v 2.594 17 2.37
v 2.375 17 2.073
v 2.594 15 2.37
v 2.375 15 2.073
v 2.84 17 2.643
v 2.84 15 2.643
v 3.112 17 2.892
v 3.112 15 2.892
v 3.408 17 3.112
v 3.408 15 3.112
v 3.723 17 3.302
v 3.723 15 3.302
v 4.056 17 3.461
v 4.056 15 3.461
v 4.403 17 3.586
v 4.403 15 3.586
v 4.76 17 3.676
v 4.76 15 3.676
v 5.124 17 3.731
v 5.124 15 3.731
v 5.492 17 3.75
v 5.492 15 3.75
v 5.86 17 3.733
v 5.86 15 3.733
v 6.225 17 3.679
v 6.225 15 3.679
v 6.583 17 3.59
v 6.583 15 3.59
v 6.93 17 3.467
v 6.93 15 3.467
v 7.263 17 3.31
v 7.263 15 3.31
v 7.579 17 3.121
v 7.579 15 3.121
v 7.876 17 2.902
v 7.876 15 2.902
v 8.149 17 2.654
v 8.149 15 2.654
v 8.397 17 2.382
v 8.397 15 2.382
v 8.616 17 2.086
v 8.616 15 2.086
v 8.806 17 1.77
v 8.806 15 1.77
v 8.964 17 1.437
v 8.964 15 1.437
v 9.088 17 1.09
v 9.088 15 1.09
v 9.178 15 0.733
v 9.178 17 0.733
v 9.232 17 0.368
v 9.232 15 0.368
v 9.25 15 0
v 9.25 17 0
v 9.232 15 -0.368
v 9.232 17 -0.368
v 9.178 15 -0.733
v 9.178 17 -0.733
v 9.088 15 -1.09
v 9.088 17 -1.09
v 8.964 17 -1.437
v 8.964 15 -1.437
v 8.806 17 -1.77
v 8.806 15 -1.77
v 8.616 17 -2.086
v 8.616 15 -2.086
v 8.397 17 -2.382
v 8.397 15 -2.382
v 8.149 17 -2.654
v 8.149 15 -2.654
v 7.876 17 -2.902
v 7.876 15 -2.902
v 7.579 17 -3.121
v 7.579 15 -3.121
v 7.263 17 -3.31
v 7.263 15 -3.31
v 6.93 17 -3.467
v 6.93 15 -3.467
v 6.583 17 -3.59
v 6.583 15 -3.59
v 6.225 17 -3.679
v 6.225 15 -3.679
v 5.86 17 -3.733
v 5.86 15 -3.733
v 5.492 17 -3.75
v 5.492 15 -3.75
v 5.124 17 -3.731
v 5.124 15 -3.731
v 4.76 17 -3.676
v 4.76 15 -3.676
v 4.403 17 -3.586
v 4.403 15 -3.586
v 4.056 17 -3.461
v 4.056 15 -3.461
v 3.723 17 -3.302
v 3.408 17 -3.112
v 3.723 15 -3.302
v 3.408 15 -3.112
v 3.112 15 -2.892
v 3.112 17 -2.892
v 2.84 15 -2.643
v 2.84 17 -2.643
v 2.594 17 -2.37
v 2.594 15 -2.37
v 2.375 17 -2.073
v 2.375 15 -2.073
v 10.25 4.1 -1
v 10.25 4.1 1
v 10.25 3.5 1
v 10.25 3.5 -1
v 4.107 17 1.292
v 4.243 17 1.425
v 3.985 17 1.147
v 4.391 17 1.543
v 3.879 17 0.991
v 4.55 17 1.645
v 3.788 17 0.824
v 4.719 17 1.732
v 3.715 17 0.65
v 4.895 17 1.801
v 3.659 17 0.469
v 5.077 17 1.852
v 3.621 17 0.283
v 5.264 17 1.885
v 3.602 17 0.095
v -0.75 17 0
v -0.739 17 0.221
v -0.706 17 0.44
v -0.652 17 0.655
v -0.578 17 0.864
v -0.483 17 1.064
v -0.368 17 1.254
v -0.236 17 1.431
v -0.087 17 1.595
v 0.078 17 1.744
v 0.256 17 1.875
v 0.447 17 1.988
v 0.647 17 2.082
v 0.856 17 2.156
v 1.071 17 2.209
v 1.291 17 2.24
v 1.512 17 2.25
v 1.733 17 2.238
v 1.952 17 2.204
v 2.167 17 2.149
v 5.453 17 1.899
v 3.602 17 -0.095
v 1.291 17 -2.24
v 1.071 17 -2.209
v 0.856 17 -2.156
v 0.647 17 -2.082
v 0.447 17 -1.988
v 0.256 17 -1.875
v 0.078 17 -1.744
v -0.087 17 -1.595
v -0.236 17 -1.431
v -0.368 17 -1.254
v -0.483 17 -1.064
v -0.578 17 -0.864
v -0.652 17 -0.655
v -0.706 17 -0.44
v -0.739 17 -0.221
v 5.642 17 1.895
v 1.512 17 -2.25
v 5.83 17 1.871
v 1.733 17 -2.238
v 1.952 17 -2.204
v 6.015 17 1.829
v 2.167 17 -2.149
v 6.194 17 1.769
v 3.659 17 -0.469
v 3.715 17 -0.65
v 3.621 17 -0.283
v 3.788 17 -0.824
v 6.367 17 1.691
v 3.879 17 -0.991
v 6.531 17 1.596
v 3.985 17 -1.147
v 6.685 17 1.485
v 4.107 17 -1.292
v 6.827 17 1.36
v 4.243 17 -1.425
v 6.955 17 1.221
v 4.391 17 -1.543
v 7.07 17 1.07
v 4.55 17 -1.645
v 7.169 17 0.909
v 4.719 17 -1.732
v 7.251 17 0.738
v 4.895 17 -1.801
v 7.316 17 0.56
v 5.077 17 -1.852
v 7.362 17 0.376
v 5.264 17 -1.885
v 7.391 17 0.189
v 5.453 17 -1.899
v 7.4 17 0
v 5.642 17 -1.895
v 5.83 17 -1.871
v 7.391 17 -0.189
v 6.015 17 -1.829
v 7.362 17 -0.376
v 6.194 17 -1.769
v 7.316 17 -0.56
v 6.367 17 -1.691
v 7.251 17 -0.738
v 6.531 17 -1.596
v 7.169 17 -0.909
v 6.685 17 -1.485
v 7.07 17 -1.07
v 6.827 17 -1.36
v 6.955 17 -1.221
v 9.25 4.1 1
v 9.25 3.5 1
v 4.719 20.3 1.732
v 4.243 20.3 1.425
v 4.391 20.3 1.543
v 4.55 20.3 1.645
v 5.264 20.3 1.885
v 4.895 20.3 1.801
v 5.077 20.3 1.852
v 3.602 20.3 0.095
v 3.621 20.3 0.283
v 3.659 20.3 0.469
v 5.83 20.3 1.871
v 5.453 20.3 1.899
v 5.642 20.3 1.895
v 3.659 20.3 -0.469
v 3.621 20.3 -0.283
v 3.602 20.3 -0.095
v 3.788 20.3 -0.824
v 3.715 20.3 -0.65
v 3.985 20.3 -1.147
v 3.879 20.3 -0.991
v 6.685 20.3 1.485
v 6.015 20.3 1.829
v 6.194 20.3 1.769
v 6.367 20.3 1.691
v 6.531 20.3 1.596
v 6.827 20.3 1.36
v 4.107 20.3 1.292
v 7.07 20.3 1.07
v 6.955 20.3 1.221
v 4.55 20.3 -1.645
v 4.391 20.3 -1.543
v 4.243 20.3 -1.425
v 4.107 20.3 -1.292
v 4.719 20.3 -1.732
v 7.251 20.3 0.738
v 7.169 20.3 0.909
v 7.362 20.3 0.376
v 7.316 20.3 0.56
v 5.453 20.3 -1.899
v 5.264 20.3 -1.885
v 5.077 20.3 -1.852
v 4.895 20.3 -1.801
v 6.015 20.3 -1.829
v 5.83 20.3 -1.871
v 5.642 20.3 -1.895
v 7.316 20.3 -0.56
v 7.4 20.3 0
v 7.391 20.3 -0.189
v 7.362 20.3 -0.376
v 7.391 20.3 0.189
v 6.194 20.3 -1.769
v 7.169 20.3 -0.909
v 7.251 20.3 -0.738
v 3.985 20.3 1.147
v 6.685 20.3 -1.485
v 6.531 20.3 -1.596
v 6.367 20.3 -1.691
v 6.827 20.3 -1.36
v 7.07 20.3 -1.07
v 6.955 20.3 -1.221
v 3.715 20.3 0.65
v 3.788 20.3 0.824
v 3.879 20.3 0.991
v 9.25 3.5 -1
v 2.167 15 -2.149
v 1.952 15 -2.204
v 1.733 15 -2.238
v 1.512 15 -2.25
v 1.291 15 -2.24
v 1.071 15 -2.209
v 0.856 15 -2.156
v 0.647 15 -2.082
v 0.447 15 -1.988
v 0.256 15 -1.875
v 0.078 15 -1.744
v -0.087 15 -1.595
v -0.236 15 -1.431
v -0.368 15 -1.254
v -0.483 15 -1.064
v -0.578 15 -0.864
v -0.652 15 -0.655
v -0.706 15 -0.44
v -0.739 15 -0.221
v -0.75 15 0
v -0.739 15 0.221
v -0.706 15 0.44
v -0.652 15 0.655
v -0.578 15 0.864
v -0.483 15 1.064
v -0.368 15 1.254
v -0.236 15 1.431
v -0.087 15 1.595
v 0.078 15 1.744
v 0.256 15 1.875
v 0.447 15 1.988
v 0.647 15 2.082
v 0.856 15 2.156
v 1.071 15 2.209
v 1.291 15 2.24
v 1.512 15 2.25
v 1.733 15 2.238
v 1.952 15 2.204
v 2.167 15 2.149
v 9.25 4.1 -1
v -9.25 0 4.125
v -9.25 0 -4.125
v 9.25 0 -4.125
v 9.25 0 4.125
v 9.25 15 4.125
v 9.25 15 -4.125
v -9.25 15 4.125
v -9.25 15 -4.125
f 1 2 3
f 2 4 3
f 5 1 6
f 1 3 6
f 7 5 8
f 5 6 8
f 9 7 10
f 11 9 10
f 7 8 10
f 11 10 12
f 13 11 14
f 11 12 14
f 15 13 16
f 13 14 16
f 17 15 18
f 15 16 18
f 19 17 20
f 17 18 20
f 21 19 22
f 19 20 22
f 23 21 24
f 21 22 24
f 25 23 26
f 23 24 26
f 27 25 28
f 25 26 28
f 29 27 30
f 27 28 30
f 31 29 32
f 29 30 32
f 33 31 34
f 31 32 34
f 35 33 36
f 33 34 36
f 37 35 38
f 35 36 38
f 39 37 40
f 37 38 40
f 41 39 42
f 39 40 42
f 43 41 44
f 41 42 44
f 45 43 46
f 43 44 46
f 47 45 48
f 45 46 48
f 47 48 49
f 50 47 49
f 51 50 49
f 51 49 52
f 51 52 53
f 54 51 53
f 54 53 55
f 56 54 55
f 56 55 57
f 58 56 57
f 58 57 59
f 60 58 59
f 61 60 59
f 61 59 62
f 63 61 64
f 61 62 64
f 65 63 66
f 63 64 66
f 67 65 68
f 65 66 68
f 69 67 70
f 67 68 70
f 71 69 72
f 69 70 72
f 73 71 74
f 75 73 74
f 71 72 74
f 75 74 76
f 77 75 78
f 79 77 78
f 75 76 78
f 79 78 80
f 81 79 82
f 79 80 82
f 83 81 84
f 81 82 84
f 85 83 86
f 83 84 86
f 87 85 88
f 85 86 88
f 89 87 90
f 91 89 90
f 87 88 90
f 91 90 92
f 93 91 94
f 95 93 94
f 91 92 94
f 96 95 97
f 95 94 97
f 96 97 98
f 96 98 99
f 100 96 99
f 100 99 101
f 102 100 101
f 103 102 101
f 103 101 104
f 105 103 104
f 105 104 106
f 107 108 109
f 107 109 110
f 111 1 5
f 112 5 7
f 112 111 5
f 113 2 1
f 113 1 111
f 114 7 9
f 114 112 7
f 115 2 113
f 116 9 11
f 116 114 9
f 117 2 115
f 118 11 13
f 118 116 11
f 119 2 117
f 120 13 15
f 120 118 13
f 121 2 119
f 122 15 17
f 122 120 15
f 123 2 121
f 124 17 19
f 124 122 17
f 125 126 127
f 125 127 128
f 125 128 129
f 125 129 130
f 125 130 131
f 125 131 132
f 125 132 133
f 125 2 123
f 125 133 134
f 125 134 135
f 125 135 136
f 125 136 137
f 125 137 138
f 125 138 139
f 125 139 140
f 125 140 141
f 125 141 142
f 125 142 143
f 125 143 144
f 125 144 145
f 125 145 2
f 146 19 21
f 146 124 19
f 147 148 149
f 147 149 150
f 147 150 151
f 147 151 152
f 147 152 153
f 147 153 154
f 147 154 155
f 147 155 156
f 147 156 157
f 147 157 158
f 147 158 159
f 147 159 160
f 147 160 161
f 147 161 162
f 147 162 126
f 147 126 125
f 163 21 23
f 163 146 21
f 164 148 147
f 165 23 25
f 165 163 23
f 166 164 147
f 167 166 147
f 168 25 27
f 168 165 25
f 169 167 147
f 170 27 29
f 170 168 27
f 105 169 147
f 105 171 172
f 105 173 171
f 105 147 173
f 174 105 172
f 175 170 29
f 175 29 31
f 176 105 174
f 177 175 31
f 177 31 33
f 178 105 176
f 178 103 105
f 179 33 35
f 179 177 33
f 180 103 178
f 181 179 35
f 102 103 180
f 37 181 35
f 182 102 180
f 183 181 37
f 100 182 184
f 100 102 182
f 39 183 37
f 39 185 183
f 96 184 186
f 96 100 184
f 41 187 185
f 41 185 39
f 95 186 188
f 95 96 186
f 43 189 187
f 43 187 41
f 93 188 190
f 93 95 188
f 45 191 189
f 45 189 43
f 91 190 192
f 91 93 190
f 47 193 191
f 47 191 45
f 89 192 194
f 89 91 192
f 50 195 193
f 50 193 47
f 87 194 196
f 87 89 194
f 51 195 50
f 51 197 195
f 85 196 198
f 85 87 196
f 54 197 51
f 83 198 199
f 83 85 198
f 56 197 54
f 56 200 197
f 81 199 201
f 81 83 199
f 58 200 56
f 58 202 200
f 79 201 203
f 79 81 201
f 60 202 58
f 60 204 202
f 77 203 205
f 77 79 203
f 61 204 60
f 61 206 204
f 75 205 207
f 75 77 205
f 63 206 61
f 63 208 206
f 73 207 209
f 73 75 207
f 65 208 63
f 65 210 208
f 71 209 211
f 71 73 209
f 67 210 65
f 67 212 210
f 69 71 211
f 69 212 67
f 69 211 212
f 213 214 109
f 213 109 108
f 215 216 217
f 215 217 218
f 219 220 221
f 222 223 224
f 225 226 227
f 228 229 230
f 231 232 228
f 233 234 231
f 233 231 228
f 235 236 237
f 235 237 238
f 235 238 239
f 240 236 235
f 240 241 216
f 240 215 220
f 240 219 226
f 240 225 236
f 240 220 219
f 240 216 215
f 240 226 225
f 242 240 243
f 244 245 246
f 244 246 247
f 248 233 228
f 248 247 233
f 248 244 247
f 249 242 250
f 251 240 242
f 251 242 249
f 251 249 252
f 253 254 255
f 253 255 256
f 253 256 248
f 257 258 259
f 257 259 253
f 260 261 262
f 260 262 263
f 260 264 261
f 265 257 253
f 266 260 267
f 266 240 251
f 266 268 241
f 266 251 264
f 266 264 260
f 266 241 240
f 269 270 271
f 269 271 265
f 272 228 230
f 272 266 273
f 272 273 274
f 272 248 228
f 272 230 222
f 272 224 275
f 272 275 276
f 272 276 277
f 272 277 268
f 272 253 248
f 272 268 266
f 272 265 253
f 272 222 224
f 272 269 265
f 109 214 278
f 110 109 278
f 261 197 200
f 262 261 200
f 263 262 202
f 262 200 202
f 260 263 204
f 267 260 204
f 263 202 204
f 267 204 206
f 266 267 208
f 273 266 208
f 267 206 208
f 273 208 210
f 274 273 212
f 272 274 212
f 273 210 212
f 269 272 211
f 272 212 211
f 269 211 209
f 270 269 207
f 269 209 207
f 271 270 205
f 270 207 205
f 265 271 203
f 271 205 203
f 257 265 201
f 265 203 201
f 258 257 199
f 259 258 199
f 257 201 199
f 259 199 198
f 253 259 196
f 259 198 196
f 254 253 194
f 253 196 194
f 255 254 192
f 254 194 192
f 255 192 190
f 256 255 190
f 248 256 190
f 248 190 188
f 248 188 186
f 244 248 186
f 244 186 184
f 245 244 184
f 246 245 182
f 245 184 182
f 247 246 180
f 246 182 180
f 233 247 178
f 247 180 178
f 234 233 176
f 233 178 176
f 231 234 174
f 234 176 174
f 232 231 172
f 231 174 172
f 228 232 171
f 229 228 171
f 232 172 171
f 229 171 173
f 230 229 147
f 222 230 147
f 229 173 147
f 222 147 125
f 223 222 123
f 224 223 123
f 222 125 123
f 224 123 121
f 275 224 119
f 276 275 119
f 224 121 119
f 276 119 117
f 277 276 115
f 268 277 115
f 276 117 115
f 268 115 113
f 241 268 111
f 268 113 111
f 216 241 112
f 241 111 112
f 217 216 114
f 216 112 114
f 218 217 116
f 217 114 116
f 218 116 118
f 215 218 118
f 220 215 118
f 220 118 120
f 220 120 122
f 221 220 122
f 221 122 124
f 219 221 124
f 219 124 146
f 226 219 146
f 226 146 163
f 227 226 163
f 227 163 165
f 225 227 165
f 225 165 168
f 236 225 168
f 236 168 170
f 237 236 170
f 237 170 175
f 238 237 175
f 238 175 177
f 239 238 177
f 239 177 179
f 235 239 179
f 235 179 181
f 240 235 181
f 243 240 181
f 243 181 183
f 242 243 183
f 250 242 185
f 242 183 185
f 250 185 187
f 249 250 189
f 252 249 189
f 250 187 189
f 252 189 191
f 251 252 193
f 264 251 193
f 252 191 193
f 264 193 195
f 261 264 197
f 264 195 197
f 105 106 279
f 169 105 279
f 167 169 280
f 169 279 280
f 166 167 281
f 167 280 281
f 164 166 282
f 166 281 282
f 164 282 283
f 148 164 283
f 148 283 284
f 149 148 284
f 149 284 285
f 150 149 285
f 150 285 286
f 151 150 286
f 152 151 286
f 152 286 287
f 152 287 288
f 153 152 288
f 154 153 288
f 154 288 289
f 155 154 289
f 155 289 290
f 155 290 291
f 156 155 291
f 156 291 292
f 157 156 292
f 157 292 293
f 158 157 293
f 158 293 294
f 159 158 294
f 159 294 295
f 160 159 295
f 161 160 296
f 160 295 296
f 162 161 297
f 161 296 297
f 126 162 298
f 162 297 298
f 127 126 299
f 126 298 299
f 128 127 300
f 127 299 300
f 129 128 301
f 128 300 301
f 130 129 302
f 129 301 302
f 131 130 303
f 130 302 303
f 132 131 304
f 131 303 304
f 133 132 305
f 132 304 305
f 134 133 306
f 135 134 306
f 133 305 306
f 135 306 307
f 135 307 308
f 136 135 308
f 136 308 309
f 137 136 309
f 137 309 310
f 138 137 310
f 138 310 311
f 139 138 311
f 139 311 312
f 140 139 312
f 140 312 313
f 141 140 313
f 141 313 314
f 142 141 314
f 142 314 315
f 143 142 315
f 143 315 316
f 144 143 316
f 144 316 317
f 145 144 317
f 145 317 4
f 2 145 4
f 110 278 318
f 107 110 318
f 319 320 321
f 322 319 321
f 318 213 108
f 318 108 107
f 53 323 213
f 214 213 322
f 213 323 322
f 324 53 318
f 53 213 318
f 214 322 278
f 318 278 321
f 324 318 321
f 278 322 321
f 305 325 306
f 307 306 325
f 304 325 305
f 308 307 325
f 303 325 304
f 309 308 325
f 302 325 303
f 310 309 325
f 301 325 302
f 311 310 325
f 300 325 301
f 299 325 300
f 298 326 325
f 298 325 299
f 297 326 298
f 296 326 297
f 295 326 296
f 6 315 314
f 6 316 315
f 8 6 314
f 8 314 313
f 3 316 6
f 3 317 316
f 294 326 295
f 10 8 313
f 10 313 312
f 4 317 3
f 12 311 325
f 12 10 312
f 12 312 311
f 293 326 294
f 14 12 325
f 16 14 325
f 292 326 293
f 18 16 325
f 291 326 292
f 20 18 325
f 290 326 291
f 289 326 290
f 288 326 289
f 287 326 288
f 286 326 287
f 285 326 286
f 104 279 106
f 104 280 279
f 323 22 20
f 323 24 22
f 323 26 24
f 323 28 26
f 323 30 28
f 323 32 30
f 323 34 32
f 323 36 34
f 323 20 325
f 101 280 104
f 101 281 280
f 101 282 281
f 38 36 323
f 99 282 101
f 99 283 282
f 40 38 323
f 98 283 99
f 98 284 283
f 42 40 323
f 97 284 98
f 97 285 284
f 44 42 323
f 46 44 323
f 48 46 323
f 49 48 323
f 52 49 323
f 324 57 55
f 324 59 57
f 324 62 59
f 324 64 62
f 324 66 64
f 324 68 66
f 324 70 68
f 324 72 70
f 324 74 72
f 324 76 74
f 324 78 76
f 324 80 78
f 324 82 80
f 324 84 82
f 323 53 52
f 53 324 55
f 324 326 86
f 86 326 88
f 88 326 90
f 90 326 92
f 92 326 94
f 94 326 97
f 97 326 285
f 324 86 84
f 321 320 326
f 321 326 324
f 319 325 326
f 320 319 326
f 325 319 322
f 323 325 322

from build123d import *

# Parameters (mm, degrees)
SKETCH_1_W      = 18.5
SKETCH_1_H      = 8.25
EXTRUDE_1_DEPTH = 15
SKETCH_2_R      = 3.75
EXTRUDE_2_DEPTH = 2
SKETCH_3_R      = 2.25
EXTRUDE_3_DEPTH = 2
SKETCH_4_R      = 1.9
EXTRUDE_4_DEPTH = 3.3
SKETCH_5_W      = 2
SKETCH_5_H      = 0.6
EXTRUDE_5_DEPTH = 1


with BuildPart() as part:
    # 草图1 → 凸台-拉伸1 (new body)
    with BuildSketch(Plane(origin=(0, 0, 0), x_dir=(1, 0, 0), z_dir=(0, 1, 0))):
        Rectangle(SKETCH_1_W, SKETCH_1_H)
    extrude(amount=EXTRUDE_1_DEPTH)

    # 草图2 → 凸台-拉伸2 (add)
    with BuildSketch(Plane(origin=(0, 15, 0), x_dir=(1, 0, 0), z_dir=(0, 1, 0))):
        with Locations((5.5, 0)):
            Circle(SKETCH_2_R)
    extrude(amount=EXTRUDE_2_DEPTH)

    # 草图3 → 凸台-拉伸3 (add)
    with BuildSketch(Plane(origin=(0, 15, 0), x_dir=(1, 0, 0), z_dir=(0, 1, 0))):
        with Locations((1.5, 0)):
            Circle(SKETCH_3_R)
    extrude(amount=EXTRUDE_3_DEPTH)

    # 草图4 → 凸台-拉伸4 (add)
    with BuildSketch(Plane(origin=(0, 17, 0), x_dir=(1, 0, 0), z_dir=(0, 1, 0))):
        with Locations((5.5, 0)):
            Circle(SKETCH_4_R)
    extrude(amount=EXTRUDE_4_DEPTH)

    # 草图5 → 凸台-拉伸5 (add)
    with BuildSketch(Plane(origin=(9.25, 0, 0), x_dir=(0, 0, -1), z_dir=(1, 0, 0))):
        with Locations((0, 3.8)):
            Rectangle(SKETCH_5_W, SKETCH_5_H)
    extrude(amount=EXTRUDE_5_DEPTH)


solid = part.part
